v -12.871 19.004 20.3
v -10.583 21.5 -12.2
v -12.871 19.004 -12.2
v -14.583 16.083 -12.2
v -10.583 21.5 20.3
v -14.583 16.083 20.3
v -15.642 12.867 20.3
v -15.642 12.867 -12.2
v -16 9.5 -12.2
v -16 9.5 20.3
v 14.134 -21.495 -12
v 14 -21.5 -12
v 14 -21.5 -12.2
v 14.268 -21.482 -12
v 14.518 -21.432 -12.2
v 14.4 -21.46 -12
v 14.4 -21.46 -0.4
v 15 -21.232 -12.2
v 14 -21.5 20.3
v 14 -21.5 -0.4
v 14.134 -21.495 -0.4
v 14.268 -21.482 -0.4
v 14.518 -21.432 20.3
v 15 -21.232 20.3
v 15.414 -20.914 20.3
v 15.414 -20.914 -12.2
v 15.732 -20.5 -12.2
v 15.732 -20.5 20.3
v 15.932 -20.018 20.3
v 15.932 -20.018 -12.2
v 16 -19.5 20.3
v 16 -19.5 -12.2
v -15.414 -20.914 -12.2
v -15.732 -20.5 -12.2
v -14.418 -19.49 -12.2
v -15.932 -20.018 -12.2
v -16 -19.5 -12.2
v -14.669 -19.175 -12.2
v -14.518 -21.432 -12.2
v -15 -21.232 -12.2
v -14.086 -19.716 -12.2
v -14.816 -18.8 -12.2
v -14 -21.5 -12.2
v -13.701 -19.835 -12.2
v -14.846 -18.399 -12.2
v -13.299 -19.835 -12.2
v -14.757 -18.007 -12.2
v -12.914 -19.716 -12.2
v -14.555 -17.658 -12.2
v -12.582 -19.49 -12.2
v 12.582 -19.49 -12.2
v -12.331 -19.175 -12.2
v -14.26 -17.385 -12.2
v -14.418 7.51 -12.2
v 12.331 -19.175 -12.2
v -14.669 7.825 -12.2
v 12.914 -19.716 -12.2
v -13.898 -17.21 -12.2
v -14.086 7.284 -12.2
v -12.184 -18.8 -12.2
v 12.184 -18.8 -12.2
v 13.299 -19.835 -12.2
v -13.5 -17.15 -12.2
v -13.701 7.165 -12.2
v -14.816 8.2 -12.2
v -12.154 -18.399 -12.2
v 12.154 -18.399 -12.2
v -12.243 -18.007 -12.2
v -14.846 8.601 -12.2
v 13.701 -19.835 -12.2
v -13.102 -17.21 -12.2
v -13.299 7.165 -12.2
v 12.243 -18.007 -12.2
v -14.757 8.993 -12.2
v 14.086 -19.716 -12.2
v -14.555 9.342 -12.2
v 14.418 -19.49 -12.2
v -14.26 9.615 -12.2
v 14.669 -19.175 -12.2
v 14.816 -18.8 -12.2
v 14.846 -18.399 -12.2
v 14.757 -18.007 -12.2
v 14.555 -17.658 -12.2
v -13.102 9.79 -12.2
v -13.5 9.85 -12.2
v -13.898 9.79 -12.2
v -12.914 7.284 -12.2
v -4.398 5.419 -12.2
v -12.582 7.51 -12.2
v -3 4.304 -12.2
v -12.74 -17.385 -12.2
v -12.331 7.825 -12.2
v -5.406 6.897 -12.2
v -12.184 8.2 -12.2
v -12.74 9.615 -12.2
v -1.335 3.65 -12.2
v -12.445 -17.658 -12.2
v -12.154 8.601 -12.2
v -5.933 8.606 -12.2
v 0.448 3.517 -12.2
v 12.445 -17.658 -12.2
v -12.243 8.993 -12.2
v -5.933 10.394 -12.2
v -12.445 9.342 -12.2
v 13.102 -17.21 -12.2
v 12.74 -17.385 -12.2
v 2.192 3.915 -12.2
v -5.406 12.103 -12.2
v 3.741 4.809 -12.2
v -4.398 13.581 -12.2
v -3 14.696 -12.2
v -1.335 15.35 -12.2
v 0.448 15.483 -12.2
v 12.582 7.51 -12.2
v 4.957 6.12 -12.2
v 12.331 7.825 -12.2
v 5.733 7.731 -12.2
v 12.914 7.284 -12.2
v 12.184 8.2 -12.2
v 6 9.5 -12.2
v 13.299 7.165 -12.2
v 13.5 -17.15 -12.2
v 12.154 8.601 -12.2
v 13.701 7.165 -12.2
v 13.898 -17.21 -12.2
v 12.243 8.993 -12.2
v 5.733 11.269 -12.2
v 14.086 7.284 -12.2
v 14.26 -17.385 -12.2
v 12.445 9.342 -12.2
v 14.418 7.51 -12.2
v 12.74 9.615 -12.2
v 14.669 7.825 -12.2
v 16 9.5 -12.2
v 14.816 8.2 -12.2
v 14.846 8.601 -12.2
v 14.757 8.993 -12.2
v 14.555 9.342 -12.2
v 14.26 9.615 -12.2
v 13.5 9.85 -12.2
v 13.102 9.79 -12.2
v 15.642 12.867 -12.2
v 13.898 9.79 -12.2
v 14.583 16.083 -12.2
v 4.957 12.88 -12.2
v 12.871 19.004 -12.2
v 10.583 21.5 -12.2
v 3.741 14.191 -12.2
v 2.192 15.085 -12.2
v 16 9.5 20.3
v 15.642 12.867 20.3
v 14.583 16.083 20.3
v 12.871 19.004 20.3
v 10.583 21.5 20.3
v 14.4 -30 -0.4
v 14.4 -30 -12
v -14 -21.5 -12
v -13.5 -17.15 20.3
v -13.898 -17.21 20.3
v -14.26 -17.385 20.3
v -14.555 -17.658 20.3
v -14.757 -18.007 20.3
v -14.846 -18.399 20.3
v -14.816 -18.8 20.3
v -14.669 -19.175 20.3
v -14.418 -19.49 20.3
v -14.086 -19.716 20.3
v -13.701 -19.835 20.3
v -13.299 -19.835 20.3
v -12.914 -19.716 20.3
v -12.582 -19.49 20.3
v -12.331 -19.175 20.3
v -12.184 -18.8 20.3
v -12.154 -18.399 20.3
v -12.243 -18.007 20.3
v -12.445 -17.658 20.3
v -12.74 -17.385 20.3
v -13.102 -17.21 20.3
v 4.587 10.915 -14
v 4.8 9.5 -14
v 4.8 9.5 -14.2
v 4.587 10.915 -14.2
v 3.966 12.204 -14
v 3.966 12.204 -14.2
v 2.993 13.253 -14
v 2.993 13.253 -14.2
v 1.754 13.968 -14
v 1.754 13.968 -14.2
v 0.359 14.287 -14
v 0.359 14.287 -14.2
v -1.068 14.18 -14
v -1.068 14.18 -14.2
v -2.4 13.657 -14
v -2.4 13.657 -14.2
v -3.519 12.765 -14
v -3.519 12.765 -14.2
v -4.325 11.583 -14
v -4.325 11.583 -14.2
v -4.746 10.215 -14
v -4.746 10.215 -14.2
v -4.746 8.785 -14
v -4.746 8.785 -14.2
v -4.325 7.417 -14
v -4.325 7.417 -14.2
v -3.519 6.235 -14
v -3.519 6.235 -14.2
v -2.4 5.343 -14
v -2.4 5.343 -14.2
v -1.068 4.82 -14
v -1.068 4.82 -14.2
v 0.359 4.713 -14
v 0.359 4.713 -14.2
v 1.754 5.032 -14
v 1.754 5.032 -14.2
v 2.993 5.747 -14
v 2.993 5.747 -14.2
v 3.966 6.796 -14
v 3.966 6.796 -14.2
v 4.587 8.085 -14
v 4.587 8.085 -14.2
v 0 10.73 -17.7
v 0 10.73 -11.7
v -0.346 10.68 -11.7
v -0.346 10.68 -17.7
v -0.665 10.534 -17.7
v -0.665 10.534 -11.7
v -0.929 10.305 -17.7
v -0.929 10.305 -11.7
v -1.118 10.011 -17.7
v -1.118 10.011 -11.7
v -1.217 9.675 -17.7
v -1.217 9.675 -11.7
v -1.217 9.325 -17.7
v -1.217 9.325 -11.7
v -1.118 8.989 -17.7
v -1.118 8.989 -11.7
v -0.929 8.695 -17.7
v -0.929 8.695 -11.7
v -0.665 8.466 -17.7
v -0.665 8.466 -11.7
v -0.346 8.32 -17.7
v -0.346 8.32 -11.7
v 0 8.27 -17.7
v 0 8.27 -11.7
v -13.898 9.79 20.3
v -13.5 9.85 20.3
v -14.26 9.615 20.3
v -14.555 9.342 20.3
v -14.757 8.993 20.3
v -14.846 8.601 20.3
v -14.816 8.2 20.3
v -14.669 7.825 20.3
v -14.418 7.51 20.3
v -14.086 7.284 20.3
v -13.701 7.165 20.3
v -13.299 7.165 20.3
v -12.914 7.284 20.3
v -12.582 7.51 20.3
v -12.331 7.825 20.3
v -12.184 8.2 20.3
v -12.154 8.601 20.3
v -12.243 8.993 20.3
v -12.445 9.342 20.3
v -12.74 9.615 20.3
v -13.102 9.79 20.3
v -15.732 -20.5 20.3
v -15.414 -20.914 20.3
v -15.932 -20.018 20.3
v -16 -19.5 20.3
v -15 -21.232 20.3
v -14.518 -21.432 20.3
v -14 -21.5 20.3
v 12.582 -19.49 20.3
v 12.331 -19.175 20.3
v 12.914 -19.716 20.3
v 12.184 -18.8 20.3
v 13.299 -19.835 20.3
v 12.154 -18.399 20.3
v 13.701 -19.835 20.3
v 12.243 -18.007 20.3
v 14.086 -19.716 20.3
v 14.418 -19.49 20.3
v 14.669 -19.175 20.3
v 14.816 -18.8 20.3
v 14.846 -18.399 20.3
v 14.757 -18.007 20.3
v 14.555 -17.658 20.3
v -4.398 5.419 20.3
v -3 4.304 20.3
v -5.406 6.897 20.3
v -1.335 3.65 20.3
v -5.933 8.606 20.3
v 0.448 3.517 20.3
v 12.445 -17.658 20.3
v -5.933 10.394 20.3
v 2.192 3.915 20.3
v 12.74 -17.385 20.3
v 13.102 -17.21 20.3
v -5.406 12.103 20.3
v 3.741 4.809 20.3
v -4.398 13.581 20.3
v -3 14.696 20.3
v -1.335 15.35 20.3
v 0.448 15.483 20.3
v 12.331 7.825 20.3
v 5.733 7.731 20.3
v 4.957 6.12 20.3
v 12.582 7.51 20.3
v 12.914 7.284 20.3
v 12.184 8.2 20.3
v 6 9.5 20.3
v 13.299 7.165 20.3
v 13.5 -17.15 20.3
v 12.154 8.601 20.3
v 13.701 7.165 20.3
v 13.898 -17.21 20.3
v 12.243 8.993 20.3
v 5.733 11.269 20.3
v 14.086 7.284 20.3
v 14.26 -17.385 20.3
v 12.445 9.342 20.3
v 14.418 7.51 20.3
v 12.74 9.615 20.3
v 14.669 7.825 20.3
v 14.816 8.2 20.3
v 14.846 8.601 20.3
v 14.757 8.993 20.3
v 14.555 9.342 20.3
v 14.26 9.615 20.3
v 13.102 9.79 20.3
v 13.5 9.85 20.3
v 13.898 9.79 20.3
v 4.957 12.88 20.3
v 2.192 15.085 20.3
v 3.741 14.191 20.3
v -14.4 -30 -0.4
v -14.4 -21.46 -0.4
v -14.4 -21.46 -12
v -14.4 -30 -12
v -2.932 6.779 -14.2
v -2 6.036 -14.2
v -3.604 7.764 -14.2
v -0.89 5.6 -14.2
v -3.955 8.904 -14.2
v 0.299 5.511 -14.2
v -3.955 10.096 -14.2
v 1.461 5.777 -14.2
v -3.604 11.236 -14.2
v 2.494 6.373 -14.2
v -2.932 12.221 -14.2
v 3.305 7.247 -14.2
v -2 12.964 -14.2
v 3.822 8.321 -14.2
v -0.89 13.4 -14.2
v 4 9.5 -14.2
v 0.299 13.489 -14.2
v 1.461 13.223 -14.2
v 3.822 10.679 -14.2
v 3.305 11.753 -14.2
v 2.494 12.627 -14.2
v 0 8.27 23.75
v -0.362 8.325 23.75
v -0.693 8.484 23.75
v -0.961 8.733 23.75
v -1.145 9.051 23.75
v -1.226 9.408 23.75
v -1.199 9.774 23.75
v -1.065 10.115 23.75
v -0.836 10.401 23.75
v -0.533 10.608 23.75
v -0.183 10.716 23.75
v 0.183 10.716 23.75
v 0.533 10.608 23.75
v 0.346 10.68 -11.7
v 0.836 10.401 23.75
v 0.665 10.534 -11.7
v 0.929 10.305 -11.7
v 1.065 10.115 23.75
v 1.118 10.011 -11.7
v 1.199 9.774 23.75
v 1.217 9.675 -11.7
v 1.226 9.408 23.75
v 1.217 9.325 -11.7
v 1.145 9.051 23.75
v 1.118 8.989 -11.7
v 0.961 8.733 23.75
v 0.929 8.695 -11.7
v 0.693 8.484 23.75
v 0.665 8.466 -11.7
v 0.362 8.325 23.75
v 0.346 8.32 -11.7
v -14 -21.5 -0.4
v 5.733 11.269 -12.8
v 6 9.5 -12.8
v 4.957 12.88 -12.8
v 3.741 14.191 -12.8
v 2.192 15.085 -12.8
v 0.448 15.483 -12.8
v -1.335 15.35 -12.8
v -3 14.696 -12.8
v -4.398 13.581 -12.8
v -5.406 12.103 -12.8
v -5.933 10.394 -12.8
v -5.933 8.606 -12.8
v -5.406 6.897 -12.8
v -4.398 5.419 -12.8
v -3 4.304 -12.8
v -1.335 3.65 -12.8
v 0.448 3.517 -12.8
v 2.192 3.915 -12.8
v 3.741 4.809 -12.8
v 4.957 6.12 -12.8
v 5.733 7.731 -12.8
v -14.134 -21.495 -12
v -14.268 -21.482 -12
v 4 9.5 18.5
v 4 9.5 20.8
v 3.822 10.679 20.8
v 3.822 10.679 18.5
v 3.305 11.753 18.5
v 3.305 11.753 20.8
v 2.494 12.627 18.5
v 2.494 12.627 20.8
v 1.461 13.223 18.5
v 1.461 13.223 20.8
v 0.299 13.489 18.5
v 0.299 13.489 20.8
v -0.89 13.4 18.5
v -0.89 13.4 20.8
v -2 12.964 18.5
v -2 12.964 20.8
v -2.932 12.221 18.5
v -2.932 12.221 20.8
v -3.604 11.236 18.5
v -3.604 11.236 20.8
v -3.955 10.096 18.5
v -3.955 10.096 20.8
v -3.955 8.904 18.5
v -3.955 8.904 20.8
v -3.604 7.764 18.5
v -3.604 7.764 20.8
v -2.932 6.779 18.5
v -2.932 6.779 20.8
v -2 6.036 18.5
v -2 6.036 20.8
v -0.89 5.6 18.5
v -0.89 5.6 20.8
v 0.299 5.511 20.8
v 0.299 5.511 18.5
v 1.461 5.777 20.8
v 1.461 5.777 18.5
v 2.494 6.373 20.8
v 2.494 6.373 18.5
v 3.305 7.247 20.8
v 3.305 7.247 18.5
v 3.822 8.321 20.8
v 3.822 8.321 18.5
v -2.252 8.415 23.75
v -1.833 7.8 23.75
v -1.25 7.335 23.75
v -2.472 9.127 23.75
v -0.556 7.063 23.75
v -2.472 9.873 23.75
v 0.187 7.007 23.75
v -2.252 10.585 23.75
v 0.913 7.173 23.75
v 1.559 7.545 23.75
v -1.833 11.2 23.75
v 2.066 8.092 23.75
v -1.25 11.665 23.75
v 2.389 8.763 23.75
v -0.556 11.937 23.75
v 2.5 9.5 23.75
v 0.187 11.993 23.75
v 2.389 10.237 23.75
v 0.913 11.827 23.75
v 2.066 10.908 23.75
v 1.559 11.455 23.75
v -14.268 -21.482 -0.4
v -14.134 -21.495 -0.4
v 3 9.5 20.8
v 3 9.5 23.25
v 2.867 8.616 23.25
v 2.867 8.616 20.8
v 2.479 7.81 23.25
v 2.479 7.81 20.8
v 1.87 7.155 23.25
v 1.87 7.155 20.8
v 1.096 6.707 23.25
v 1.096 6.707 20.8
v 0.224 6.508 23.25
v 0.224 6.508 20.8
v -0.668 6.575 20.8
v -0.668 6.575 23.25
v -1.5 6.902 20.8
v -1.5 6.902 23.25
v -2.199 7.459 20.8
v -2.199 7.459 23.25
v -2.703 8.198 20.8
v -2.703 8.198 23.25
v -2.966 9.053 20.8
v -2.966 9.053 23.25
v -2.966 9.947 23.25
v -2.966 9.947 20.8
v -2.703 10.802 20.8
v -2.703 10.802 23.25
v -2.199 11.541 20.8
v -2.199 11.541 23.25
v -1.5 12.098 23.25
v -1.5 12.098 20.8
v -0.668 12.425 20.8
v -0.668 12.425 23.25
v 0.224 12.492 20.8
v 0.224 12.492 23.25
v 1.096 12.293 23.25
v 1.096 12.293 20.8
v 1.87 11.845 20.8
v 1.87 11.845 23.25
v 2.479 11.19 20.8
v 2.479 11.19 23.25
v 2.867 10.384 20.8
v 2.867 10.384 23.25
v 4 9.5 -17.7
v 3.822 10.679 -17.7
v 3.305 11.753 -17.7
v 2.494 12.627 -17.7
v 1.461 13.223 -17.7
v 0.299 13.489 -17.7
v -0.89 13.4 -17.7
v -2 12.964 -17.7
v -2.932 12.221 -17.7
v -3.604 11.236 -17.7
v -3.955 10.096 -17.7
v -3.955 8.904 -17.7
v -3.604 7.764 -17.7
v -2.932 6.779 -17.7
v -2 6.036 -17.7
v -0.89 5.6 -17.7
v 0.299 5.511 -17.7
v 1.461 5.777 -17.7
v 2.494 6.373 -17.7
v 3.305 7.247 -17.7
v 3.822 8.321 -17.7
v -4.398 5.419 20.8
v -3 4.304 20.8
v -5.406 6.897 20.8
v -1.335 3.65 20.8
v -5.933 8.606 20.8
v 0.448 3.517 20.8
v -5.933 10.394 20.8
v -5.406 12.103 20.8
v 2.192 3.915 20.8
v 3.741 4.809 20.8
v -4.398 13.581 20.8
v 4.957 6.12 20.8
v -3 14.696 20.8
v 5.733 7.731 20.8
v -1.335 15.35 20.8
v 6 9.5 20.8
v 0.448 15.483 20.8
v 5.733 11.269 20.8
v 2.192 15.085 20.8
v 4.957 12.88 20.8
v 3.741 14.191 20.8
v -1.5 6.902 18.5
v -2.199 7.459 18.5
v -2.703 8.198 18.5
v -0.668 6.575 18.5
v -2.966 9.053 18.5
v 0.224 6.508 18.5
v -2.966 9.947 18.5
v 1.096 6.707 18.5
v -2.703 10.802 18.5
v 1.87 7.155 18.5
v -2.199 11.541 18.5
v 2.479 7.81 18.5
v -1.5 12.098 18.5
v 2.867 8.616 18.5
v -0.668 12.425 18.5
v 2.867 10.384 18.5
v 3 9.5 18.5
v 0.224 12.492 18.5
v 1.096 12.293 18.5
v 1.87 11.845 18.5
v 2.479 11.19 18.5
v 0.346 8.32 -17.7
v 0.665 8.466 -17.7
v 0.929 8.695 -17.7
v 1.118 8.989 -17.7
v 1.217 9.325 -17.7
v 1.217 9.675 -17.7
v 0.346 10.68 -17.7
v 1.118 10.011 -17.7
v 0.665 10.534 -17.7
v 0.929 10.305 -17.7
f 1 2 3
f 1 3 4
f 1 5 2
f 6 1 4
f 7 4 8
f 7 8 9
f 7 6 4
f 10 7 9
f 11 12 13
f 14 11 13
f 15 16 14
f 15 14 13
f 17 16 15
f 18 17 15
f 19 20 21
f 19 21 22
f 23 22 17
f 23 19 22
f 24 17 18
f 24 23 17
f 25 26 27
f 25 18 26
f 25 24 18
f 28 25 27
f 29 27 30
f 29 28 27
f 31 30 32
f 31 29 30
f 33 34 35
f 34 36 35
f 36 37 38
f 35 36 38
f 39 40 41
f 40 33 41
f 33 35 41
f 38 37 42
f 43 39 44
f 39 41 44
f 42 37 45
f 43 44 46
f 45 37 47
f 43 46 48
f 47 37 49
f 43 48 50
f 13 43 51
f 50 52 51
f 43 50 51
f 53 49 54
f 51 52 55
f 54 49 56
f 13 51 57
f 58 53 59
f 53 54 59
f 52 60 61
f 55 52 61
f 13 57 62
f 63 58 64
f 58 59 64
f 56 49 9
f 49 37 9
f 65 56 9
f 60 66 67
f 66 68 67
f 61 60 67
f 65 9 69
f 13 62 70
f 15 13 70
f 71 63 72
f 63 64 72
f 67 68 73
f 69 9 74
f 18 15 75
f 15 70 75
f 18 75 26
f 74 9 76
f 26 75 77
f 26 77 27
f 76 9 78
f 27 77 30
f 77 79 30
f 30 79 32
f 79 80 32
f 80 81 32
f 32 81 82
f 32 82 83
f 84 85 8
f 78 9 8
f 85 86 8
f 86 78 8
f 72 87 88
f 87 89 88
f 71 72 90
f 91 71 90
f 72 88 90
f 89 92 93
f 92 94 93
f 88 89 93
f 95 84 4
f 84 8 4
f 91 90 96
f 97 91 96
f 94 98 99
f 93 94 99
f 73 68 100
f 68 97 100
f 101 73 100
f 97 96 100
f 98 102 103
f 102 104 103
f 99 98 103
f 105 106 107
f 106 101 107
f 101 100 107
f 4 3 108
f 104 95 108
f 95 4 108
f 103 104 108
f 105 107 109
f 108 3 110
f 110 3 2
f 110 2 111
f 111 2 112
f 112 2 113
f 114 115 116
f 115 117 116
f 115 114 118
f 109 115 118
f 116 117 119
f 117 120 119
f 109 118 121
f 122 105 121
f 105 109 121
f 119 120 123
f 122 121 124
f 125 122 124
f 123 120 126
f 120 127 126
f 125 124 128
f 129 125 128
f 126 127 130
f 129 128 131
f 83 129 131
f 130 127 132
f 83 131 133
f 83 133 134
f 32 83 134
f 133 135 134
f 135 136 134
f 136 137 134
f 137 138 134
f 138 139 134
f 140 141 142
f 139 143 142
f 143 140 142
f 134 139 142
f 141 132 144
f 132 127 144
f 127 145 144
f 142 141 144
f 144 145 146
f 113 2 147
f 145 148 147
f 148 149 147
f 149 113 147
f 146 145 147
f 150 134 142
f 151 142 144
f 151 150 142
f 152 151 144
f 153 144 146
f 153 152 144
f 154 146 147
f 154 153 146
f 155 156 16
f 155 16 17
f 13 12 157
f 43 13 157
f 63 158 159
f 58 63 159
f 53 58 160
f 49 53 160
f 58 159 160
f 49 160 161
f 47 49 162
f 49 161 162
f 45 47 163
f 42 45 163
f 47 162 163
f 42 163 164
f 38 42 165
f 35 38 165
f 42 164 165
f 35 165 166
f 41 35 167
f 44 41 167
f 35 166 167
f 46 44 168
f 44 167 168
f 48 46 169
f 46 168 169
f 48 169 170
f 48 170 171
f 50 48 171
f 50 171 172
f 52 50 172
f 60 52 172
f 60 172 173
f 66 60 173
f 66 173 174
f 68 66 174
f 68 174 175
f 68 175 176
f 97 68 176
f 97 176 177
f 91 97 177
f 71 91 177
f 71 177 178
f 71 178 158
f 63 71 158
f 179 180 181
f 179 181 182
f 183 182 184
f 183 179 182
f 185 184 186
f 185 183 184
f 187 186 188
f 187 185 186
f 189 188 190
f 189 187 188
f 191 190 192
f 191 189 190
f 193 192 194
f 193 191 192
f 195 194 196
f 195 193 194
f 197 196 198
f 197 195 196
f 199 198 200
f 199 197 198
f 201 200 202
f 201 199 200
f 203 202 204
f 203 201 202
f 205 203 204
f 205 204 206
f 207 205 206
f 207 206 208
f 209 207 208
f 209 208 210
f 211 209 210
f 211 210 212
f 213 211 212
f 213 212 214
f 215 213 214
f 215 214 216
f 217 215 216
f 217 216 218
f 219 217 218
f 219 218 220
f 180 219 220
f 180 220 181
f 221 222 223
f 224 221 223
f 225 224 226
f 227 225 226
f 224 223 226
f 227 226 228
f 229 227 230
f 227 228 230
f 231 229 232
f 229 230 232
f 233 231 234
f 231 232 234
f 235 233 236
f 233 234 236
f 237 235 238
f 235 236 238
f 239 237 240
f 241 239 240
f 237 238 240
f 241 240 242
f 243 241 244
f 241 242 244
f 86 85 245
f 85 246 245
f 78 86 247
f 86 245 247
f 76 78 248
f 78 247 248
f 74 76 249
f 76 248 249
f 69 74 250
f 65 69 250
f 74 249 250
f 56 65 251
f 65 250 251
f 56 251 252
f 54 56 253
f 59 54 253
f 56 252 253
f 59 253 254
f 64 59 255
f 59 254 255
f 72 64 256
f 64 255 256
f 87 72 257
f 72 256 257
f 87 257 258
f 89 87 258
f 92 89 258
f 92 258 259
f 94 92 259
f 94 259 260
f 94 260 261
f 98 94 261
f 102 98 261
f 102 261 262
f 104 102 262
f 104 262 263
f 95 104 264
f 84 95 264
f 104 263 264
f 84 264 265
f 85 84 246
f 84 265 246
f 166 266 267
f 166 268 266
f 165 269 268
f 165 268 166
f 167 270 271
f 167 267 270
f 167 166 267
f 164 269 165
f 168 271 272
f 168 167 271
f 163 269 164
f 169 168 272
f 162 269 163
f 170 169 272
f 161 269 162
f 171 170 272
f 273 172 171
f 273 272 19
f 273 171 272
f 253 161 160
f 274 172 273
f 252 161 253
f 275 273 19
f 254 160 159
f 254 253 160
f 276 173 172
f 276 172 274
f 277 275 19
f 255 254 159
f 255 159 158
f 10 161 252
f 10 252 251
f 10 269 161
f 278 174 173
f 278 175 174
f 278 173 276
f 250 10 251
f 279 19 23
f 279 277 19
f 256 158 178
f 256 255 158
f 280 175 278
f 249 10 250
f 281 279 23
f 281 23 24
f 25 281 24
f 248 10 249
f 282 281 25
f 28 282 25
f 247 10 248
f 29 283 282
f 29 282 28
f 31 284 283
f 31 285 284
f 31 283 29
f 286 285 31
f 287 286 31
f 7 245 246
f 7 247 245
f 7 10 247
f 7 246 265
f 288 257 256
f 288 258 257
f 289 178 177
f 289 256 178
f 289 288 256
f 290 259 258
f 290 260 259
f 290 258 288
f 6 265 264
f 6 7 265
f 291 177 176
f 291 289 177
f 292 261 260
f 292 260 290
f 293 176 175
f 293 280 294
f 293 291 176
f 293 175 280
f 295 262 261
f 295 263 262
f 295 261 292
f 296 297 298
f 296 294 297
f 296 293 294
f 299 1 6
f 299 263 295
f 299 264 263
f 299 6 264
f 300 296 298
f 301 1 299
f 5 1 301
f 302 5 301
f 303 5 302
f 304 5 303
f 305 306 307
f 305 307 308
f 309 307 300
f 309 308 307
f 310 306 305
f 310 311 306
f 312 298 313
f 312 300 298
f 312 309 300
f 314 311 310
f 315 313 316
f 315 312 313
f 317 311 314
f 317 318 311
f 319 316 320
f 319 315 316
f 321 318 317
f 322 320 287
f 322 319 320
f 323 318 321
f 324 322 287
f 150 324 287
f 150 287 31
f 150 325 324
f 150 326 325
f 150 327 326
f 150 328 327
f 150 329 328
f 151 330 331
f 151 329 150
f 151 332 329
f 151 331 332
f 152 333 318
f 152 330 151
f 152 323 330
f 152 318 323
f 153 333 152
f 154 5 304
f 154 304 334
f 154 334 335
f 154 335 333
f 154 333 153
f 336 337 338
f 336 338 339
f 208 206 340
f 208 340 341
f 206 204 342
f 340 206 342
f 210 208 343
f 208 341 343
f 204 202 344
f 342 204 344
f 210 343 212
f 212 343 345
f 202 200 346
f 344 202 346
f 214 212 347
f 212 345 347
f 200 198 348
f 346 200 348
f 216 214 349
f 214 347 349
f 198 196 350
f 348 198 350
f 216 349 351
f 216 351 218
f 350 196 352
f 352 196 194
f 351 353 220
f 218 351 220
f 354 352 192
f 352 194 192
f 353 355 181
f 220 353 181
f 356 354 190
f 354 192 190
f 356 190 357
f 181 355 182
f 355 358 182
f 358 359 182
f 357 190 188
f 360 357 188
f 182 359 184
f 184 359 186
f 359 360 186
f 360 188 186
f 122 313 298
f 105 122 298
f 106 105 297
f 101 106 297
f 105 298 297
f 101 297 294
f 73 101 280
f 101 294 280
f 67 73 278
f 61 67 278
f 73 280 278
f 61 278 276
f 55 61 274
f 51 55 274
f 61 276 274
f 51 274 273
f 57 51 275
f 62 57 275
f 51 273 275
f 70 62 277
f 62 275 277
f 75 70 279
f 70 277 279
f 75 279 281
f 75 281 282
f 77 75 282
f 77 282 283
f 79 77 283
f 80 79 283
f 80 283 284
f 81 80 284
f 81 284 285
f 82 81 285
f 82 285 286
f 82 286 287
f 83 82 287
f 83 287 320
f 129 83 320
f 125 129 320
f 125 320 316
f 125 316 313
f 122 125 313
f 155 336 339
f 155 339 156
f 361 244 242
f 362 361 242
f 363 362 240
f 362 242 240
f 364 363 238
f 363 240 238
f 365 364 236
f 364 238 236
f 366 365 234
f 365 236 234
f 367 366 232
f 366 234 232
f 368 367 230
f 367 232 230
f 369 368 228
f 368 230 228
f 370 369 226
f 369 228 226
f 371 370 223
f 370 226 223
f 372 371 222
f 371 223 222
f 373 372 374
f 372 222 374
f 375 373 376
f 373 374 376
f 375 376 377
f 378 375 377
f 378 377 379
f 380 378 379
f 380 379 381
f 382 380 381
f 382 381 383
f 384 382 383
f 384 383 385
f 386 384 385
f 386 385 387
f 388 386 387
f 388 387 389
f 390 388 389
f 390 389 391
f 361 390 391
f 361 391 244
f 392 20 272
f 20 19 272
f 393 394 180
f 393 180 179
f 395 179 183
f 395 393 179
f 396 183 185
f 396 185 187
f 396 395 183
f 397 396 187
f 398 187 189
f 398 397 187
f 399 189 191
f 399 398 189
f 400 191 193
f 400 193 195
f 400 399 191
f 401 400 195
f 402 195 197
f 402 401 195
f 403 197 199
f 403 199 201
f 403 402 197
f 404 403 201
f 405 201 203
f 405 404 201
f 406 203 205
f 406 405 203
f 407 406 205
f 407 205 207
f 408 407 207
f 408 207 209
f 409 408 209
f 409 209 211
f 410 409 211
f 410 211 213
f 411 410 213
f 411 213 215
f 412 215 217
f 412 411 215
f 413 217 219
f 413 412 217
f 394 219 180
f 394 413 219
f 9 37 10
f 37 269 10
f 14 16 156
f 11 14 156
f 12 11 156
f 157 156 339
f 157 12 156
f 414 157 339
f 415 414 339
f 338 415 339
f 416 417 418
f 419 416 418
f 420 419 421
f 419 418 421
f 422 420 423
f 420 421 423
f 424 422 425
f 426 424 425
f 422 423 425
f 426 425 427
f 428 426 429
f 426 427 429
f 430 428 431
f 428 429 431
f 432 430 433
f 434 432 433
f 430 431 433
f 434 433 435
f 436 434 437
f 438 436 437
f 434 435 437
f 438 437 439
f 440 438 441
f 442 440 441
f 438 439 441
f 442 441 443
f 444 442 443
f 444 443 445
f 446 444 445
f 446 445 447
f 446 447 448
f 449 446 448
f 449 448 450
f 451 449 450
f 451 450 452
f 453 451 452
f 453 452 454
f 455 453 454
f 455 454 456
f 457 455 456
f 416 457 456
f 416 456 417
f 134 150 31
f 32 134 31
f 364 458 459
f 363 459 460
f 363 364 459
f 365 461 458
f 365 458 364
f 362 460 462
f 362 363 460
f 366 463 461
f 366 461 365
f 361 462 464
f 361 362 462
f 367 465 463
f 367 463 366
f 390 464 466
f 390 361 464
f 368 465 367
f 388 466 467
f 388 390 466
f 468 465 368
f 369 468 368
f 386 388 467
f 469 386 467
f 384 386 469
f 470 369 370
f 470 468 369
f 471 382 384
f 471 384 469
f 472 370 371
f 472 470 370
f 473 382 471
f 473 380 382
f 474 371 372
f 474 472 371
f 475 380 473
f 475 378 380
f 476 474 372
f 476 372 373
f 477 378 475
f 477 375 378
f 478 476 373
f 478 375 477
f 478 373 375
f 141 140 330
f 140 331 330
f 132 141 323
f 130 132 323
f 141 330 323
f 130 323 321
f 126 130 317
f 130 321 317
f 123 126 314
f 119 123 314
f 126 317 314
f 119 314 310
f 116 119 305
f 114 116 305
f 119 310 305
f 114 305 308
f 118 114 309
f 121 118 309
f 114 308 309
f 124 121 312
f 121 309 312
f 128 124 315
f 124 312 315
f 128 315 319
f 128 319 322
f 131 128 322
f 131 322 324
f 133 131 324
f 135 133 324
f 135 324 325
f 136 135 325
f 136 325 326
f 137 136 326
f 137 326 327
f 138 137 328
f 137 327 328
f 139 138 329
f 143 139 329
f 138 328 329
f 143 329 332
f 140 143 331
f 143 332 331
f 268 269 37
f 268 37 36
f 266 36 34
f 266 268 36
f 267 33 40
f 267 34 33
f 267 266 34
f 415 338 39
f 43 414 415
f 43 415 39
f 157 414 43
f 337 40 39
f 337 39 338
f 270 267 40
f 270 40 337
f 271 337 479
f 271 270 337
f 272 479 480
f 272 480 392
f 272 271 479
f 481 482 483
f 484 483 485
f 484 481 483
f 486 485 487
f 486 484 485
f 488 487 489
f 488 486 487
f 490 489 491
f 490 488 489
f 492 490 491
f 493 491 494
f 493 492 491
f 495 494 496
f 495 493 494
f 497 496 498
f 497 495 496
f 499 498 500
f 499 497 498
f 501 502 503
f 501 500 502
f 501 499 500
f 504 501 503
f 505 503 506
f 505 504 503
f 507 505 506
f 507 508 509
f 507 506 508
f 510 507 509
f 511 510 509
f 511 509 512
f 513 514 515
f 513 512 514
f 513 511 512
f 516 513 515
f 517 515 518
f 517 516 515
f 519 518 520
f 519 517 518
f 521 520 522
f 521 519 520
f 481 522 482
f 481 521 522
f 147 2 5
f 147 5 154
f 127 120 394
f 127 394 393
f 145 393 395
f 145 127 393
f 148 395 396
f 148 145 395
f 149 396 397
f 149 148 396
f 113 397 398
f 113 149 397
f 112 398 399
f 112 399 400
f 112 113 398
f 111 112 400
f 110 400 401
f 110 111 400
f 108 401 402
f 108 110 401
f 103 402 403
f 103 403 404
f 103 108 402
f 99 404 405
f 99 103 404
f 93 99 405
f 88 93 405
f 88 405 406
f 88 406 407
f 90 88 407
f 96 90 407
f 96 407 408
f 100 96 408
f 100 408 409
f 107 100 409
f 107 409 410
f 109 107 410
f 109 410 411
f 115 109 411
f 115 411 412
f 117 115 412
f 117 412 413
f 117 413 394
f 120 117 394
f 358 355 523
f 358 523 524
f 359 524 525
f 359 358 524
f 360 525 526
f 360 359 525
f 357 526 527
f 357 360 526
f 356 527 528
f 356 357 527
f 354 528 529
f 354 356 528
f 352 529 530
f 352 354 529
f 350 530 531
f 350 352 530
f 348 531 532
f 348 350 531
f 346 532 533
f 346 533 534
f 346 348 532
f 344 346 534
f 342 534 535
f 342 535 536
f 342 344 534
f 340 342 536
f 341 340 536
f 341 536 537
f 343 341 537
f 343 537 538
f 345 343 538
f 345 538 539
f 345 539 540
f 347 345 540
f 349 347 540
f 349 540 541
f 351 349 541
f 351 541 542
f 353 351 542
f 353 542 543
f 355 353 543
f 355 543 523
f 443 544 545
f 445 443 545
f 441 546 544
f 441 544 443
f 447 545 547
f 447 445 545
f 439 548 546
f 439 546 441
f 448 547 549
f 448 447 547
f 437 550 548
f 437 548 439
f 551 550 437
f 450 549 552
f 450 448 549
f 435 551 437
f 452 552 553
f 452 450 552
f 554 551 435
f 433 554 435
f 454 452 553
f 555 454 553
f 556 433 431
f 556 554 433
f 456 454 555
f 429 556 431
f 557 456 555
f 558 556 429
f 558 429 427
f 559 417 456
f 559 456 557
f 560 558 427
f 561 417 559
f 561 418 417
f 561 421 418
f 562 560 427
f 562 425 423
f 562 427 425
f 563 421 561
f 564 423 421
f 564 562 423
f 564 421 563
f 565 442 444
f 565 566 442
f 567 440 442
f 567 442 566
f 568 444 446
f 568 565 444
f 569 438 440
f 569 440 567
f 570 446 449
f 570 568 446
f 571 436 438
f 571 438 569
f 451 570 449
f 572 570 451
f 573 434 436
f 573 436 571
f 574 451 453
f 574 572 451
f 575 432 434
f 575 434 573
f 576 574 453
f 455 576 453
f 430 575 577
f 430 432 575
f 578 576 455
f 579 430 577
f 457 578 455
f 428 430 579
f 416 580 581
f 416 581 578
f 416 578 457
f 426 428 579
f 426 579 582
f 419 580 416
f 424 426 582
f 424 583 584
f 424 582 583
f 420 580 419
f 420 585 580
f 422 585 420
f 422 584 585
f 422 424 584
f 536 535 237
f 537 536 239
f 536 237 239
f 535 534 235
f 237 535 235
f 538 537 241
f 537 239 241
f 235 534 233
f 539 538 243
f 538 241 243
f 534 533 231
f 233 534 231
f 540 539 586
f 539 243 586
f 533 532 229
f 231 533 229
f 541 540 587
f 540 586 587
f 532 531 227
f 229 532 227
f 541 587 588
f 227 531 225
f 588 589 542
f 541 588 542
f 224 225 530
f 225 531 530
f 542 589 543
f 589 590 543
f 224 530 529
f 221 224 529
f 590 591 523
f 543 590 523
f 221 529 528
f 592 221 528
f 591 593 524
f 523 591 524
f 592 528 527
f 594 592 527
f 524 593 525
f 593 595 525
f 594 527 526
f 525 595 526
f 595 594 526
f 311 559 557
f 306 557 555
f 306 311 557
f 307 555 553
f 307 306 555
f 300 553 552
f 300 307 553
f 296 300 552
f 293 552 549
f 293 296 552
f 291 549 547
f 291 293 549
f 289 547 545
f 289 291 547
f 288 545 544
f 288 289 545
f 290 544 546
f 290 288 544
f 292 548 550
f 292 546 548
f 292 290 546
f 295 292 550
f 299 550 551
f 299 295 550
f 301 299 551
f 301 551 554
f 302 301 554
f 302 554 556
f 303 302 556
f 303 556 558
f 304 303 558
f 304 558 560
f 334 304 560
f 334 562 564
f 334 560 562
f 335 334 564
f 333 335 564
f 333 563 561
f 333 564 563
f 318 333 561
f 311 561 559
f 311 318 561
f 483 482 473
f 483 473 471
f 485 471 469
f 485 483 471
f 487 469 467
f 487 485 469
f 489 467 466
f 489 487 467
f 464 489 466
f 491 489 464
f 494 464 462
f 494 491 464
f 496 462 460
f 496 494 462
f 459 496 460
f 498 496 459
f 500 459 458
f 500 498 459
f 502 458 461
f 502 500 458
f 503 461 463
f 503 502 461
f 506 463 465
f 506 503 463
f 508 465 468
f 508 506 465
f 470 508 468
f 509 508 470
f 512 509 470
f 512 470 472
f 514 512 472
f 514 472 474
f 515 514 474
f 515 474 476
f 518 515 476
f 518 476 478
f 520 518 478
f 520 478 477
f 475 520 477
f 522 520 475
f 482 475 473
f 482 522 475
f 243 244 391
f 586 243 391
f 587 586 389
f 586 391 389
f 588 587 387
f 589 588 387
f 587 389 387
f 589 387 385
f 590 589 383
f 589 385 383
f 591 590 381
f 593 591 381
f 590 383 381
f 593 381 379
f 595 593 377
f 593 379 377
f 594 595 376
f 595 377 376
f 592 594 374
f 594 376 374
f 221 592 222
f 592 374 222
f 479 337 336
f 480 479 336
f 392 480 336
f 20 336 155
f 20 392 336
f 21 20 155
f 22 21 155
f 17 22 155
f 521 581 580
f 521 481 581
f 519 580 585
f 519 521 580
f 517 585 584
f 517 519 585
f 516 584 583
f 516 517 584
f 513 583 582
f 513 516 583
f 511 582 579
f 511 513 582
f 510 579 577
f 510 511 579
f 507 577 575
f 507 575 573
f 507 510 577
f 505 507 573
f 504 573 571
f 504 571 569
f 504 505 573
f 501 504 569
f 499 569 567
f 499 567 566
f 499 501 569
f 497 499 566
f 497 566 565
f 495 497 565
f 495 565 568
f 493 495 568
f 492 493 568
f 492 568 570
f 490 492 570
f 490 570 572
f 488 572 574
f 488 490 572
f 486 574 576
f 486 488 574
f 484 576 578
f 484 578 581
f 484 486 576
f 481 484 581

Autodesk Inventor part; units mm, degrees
ref_plane "YZ Plane" through (0, 0, 0) normal (1, 0, 0) x (0, 1, 0)
ref_plane "XZ Plane" through (0, 0, 0) normal (0, 1, 0) x (-1, 0, 0)
ref_plane "XY Plane" through (0, 0, 0) normal (0, 0, 1) x (1, 0, 0)
sketch "スケッチ1" plane through (0, 0, 0) normal (0, 0, 1) x (1, 0, 0)
  line L0 (-16, 21.5) -> (-10.583, 21.5) construction
  line L1 (16, 21.5) -> (16, 9.5) construction
  line L2 (16, -21.5) -> (-16, -21.5)
  line L3 (-16, -21.5) -> (-16, 9.5)
  line L4 (-16, 21.5) -> (16, -21.5) construction
  line L5 (16, 21.5) -> (-16, -21.5) construction
  line L6 (-14.4, -21.5) -> (-14.4, -30)
  line L7 (-14.4, -30) -> (14.4, -30)
  line L8 (0, 21.5) -> (0, -21.5) construction
  line L9 (14.4, -21.5) -> (14.4, -30)
  line L10 (-13.5, 21.5) -> (-13.5, -21.5) construction
  circle A0 centre (0, 9.5) radius 6
  circle A1 centre (0, 9.5) radius 4
  arc A2 (-10.583, 21.5) -> (-16, 9.5) centre (0, 9.5) ccw
  arc A3 (16, 9.5) -> (10.583, 21.5) centre (0, 9.5) ccw
  line L11 (-10.583, 21.5) -> (10.583, 21.5)
  line L12 (-16, 9.5) -> (-16, 21.5) construction
  line L13 (10.583, 21.5) -> (16, 21.5) construction
  line L14 (16, 9.5) -> (16, -21.5)
  circle A4 centre (0, 9.5) radius 3
  circle A5 centre (0, 9.5) radius 4.8
  point P0 (0, 0)
  point P1 (-13.5, 8.5)
  point P2 (-13.5, -18.5)
  point P3 (13.5, 8.5)
  point P4 (13.5, -18.5)
  dimension "d0" = 32
  dimension "d1" = 43
  dimension "d4" = 28.8
  dimension "d5" = 8.5
  dimension "d8" = 27
  dimension "d9" = 8.5
  dimension "d12" = 18.5
  dimension "d13" = 12
  dimension "d14" = 8
  dimension "d15" = 9.5
  dimension "d17" = 16
  dimension "d32" = 13.5
  dimension "d47" = 6
  dimension "d67" = 9.6
extrude "押し出し1" add sketch "スケッチ1" against normal blind 12.2 contours L2 L3 A2 L11 A3 L14 | A0 | A1 | A4 | A5
extrude "押し出し2" add sketch "スケッチ1" against normal blind 12 contours L9 L7 L6 L2
extrude "押し出し3" add sketch "スケッチ1" against normal blind 14 contours A0 | A1 | A4 | A5
extrude "押し出し4" add sketch "スケッチ1" against normal blind 17.7 contours A1 | A4
chamfer "面取り1" distance 1.2 angle 45 1 edges at (-6, 9.5, -14)
sketch "スケッチ2" plane through (0, 9.5, -17.7) normal (0, 0, -1) x (-1, 0, 0)
  circle A0 centre (0, 0) radius 4 projected
  point P0 (0, -9.5)
hole "穴1" at (0, 9.5, -17.7) direction (0, 0, 1) diameter 2.459 depth 6 thread size "M3x0.5" class "6H" standard "ANSI Metric M Profile"
extrude "押し出し5" add sketch "スケッチ1" along normal blind 20.3 contours L2 L3 A2 L11 A3 L14 | A0 | A1 | A4 | A5
hole "穴2" at (-13.5, 8.5, 0) at (-13.5, -18.5, 0) at (13.5, 8.5, 0) at (13.5, -18.5, 0) direction (0, 0, 1) diameter 2.7 end through all both
extrude "押し出し6" cut sketch "スケッチ1" against normal blind 0.4 contours L9 L7 L6 L2
fillet "フィレット1" radius 2 2 edges at (16, -21.5, 4.05) (-16, -21.5, 4.05)
extrude "押し出し7" add sketch "スケッチ1" along normal blind 20.8 contours A0 | A1 | A4 | A5
extrude "押し出し8" add sketch "スケッチ1" along normal blind 23.75 contours A4
sketch "スケッチ3" plane through (0, 9.5, 23.75) normal (0, 0, 1) x (1, 0, 0)
  circle A0 centre (0, 0) radius 1.2295 projected
  point P0 (0, -9.5)
hole "穴3" at (0, 9.5, 23.75) direction (0, 0, -1) diameter 2.459 end through all thread size "M3x0.5" class "6H" standard "ANSI Metric M Profile"
sketch "スケッチ4" plane through (0, 9.5, 20.8) normal (0, 0, 1) x (1, 0, 0)
  circle A0 centre (0, 0) radius 4
  circle A1 centre (0, 0) radius 3
  point P0 (0, -9.5)
extrude "押し出し9" cut sketch "スケッチ4" against normal blind 2.3
chamfer "面取り2" distance 0.5 angle 45 1 edges at (-3, 9.5, 23.75)
extrude "押し出し10" add sketch "スケッチ1" against normal blind 14.2 contours A5
properties part number "B3M10xx"
